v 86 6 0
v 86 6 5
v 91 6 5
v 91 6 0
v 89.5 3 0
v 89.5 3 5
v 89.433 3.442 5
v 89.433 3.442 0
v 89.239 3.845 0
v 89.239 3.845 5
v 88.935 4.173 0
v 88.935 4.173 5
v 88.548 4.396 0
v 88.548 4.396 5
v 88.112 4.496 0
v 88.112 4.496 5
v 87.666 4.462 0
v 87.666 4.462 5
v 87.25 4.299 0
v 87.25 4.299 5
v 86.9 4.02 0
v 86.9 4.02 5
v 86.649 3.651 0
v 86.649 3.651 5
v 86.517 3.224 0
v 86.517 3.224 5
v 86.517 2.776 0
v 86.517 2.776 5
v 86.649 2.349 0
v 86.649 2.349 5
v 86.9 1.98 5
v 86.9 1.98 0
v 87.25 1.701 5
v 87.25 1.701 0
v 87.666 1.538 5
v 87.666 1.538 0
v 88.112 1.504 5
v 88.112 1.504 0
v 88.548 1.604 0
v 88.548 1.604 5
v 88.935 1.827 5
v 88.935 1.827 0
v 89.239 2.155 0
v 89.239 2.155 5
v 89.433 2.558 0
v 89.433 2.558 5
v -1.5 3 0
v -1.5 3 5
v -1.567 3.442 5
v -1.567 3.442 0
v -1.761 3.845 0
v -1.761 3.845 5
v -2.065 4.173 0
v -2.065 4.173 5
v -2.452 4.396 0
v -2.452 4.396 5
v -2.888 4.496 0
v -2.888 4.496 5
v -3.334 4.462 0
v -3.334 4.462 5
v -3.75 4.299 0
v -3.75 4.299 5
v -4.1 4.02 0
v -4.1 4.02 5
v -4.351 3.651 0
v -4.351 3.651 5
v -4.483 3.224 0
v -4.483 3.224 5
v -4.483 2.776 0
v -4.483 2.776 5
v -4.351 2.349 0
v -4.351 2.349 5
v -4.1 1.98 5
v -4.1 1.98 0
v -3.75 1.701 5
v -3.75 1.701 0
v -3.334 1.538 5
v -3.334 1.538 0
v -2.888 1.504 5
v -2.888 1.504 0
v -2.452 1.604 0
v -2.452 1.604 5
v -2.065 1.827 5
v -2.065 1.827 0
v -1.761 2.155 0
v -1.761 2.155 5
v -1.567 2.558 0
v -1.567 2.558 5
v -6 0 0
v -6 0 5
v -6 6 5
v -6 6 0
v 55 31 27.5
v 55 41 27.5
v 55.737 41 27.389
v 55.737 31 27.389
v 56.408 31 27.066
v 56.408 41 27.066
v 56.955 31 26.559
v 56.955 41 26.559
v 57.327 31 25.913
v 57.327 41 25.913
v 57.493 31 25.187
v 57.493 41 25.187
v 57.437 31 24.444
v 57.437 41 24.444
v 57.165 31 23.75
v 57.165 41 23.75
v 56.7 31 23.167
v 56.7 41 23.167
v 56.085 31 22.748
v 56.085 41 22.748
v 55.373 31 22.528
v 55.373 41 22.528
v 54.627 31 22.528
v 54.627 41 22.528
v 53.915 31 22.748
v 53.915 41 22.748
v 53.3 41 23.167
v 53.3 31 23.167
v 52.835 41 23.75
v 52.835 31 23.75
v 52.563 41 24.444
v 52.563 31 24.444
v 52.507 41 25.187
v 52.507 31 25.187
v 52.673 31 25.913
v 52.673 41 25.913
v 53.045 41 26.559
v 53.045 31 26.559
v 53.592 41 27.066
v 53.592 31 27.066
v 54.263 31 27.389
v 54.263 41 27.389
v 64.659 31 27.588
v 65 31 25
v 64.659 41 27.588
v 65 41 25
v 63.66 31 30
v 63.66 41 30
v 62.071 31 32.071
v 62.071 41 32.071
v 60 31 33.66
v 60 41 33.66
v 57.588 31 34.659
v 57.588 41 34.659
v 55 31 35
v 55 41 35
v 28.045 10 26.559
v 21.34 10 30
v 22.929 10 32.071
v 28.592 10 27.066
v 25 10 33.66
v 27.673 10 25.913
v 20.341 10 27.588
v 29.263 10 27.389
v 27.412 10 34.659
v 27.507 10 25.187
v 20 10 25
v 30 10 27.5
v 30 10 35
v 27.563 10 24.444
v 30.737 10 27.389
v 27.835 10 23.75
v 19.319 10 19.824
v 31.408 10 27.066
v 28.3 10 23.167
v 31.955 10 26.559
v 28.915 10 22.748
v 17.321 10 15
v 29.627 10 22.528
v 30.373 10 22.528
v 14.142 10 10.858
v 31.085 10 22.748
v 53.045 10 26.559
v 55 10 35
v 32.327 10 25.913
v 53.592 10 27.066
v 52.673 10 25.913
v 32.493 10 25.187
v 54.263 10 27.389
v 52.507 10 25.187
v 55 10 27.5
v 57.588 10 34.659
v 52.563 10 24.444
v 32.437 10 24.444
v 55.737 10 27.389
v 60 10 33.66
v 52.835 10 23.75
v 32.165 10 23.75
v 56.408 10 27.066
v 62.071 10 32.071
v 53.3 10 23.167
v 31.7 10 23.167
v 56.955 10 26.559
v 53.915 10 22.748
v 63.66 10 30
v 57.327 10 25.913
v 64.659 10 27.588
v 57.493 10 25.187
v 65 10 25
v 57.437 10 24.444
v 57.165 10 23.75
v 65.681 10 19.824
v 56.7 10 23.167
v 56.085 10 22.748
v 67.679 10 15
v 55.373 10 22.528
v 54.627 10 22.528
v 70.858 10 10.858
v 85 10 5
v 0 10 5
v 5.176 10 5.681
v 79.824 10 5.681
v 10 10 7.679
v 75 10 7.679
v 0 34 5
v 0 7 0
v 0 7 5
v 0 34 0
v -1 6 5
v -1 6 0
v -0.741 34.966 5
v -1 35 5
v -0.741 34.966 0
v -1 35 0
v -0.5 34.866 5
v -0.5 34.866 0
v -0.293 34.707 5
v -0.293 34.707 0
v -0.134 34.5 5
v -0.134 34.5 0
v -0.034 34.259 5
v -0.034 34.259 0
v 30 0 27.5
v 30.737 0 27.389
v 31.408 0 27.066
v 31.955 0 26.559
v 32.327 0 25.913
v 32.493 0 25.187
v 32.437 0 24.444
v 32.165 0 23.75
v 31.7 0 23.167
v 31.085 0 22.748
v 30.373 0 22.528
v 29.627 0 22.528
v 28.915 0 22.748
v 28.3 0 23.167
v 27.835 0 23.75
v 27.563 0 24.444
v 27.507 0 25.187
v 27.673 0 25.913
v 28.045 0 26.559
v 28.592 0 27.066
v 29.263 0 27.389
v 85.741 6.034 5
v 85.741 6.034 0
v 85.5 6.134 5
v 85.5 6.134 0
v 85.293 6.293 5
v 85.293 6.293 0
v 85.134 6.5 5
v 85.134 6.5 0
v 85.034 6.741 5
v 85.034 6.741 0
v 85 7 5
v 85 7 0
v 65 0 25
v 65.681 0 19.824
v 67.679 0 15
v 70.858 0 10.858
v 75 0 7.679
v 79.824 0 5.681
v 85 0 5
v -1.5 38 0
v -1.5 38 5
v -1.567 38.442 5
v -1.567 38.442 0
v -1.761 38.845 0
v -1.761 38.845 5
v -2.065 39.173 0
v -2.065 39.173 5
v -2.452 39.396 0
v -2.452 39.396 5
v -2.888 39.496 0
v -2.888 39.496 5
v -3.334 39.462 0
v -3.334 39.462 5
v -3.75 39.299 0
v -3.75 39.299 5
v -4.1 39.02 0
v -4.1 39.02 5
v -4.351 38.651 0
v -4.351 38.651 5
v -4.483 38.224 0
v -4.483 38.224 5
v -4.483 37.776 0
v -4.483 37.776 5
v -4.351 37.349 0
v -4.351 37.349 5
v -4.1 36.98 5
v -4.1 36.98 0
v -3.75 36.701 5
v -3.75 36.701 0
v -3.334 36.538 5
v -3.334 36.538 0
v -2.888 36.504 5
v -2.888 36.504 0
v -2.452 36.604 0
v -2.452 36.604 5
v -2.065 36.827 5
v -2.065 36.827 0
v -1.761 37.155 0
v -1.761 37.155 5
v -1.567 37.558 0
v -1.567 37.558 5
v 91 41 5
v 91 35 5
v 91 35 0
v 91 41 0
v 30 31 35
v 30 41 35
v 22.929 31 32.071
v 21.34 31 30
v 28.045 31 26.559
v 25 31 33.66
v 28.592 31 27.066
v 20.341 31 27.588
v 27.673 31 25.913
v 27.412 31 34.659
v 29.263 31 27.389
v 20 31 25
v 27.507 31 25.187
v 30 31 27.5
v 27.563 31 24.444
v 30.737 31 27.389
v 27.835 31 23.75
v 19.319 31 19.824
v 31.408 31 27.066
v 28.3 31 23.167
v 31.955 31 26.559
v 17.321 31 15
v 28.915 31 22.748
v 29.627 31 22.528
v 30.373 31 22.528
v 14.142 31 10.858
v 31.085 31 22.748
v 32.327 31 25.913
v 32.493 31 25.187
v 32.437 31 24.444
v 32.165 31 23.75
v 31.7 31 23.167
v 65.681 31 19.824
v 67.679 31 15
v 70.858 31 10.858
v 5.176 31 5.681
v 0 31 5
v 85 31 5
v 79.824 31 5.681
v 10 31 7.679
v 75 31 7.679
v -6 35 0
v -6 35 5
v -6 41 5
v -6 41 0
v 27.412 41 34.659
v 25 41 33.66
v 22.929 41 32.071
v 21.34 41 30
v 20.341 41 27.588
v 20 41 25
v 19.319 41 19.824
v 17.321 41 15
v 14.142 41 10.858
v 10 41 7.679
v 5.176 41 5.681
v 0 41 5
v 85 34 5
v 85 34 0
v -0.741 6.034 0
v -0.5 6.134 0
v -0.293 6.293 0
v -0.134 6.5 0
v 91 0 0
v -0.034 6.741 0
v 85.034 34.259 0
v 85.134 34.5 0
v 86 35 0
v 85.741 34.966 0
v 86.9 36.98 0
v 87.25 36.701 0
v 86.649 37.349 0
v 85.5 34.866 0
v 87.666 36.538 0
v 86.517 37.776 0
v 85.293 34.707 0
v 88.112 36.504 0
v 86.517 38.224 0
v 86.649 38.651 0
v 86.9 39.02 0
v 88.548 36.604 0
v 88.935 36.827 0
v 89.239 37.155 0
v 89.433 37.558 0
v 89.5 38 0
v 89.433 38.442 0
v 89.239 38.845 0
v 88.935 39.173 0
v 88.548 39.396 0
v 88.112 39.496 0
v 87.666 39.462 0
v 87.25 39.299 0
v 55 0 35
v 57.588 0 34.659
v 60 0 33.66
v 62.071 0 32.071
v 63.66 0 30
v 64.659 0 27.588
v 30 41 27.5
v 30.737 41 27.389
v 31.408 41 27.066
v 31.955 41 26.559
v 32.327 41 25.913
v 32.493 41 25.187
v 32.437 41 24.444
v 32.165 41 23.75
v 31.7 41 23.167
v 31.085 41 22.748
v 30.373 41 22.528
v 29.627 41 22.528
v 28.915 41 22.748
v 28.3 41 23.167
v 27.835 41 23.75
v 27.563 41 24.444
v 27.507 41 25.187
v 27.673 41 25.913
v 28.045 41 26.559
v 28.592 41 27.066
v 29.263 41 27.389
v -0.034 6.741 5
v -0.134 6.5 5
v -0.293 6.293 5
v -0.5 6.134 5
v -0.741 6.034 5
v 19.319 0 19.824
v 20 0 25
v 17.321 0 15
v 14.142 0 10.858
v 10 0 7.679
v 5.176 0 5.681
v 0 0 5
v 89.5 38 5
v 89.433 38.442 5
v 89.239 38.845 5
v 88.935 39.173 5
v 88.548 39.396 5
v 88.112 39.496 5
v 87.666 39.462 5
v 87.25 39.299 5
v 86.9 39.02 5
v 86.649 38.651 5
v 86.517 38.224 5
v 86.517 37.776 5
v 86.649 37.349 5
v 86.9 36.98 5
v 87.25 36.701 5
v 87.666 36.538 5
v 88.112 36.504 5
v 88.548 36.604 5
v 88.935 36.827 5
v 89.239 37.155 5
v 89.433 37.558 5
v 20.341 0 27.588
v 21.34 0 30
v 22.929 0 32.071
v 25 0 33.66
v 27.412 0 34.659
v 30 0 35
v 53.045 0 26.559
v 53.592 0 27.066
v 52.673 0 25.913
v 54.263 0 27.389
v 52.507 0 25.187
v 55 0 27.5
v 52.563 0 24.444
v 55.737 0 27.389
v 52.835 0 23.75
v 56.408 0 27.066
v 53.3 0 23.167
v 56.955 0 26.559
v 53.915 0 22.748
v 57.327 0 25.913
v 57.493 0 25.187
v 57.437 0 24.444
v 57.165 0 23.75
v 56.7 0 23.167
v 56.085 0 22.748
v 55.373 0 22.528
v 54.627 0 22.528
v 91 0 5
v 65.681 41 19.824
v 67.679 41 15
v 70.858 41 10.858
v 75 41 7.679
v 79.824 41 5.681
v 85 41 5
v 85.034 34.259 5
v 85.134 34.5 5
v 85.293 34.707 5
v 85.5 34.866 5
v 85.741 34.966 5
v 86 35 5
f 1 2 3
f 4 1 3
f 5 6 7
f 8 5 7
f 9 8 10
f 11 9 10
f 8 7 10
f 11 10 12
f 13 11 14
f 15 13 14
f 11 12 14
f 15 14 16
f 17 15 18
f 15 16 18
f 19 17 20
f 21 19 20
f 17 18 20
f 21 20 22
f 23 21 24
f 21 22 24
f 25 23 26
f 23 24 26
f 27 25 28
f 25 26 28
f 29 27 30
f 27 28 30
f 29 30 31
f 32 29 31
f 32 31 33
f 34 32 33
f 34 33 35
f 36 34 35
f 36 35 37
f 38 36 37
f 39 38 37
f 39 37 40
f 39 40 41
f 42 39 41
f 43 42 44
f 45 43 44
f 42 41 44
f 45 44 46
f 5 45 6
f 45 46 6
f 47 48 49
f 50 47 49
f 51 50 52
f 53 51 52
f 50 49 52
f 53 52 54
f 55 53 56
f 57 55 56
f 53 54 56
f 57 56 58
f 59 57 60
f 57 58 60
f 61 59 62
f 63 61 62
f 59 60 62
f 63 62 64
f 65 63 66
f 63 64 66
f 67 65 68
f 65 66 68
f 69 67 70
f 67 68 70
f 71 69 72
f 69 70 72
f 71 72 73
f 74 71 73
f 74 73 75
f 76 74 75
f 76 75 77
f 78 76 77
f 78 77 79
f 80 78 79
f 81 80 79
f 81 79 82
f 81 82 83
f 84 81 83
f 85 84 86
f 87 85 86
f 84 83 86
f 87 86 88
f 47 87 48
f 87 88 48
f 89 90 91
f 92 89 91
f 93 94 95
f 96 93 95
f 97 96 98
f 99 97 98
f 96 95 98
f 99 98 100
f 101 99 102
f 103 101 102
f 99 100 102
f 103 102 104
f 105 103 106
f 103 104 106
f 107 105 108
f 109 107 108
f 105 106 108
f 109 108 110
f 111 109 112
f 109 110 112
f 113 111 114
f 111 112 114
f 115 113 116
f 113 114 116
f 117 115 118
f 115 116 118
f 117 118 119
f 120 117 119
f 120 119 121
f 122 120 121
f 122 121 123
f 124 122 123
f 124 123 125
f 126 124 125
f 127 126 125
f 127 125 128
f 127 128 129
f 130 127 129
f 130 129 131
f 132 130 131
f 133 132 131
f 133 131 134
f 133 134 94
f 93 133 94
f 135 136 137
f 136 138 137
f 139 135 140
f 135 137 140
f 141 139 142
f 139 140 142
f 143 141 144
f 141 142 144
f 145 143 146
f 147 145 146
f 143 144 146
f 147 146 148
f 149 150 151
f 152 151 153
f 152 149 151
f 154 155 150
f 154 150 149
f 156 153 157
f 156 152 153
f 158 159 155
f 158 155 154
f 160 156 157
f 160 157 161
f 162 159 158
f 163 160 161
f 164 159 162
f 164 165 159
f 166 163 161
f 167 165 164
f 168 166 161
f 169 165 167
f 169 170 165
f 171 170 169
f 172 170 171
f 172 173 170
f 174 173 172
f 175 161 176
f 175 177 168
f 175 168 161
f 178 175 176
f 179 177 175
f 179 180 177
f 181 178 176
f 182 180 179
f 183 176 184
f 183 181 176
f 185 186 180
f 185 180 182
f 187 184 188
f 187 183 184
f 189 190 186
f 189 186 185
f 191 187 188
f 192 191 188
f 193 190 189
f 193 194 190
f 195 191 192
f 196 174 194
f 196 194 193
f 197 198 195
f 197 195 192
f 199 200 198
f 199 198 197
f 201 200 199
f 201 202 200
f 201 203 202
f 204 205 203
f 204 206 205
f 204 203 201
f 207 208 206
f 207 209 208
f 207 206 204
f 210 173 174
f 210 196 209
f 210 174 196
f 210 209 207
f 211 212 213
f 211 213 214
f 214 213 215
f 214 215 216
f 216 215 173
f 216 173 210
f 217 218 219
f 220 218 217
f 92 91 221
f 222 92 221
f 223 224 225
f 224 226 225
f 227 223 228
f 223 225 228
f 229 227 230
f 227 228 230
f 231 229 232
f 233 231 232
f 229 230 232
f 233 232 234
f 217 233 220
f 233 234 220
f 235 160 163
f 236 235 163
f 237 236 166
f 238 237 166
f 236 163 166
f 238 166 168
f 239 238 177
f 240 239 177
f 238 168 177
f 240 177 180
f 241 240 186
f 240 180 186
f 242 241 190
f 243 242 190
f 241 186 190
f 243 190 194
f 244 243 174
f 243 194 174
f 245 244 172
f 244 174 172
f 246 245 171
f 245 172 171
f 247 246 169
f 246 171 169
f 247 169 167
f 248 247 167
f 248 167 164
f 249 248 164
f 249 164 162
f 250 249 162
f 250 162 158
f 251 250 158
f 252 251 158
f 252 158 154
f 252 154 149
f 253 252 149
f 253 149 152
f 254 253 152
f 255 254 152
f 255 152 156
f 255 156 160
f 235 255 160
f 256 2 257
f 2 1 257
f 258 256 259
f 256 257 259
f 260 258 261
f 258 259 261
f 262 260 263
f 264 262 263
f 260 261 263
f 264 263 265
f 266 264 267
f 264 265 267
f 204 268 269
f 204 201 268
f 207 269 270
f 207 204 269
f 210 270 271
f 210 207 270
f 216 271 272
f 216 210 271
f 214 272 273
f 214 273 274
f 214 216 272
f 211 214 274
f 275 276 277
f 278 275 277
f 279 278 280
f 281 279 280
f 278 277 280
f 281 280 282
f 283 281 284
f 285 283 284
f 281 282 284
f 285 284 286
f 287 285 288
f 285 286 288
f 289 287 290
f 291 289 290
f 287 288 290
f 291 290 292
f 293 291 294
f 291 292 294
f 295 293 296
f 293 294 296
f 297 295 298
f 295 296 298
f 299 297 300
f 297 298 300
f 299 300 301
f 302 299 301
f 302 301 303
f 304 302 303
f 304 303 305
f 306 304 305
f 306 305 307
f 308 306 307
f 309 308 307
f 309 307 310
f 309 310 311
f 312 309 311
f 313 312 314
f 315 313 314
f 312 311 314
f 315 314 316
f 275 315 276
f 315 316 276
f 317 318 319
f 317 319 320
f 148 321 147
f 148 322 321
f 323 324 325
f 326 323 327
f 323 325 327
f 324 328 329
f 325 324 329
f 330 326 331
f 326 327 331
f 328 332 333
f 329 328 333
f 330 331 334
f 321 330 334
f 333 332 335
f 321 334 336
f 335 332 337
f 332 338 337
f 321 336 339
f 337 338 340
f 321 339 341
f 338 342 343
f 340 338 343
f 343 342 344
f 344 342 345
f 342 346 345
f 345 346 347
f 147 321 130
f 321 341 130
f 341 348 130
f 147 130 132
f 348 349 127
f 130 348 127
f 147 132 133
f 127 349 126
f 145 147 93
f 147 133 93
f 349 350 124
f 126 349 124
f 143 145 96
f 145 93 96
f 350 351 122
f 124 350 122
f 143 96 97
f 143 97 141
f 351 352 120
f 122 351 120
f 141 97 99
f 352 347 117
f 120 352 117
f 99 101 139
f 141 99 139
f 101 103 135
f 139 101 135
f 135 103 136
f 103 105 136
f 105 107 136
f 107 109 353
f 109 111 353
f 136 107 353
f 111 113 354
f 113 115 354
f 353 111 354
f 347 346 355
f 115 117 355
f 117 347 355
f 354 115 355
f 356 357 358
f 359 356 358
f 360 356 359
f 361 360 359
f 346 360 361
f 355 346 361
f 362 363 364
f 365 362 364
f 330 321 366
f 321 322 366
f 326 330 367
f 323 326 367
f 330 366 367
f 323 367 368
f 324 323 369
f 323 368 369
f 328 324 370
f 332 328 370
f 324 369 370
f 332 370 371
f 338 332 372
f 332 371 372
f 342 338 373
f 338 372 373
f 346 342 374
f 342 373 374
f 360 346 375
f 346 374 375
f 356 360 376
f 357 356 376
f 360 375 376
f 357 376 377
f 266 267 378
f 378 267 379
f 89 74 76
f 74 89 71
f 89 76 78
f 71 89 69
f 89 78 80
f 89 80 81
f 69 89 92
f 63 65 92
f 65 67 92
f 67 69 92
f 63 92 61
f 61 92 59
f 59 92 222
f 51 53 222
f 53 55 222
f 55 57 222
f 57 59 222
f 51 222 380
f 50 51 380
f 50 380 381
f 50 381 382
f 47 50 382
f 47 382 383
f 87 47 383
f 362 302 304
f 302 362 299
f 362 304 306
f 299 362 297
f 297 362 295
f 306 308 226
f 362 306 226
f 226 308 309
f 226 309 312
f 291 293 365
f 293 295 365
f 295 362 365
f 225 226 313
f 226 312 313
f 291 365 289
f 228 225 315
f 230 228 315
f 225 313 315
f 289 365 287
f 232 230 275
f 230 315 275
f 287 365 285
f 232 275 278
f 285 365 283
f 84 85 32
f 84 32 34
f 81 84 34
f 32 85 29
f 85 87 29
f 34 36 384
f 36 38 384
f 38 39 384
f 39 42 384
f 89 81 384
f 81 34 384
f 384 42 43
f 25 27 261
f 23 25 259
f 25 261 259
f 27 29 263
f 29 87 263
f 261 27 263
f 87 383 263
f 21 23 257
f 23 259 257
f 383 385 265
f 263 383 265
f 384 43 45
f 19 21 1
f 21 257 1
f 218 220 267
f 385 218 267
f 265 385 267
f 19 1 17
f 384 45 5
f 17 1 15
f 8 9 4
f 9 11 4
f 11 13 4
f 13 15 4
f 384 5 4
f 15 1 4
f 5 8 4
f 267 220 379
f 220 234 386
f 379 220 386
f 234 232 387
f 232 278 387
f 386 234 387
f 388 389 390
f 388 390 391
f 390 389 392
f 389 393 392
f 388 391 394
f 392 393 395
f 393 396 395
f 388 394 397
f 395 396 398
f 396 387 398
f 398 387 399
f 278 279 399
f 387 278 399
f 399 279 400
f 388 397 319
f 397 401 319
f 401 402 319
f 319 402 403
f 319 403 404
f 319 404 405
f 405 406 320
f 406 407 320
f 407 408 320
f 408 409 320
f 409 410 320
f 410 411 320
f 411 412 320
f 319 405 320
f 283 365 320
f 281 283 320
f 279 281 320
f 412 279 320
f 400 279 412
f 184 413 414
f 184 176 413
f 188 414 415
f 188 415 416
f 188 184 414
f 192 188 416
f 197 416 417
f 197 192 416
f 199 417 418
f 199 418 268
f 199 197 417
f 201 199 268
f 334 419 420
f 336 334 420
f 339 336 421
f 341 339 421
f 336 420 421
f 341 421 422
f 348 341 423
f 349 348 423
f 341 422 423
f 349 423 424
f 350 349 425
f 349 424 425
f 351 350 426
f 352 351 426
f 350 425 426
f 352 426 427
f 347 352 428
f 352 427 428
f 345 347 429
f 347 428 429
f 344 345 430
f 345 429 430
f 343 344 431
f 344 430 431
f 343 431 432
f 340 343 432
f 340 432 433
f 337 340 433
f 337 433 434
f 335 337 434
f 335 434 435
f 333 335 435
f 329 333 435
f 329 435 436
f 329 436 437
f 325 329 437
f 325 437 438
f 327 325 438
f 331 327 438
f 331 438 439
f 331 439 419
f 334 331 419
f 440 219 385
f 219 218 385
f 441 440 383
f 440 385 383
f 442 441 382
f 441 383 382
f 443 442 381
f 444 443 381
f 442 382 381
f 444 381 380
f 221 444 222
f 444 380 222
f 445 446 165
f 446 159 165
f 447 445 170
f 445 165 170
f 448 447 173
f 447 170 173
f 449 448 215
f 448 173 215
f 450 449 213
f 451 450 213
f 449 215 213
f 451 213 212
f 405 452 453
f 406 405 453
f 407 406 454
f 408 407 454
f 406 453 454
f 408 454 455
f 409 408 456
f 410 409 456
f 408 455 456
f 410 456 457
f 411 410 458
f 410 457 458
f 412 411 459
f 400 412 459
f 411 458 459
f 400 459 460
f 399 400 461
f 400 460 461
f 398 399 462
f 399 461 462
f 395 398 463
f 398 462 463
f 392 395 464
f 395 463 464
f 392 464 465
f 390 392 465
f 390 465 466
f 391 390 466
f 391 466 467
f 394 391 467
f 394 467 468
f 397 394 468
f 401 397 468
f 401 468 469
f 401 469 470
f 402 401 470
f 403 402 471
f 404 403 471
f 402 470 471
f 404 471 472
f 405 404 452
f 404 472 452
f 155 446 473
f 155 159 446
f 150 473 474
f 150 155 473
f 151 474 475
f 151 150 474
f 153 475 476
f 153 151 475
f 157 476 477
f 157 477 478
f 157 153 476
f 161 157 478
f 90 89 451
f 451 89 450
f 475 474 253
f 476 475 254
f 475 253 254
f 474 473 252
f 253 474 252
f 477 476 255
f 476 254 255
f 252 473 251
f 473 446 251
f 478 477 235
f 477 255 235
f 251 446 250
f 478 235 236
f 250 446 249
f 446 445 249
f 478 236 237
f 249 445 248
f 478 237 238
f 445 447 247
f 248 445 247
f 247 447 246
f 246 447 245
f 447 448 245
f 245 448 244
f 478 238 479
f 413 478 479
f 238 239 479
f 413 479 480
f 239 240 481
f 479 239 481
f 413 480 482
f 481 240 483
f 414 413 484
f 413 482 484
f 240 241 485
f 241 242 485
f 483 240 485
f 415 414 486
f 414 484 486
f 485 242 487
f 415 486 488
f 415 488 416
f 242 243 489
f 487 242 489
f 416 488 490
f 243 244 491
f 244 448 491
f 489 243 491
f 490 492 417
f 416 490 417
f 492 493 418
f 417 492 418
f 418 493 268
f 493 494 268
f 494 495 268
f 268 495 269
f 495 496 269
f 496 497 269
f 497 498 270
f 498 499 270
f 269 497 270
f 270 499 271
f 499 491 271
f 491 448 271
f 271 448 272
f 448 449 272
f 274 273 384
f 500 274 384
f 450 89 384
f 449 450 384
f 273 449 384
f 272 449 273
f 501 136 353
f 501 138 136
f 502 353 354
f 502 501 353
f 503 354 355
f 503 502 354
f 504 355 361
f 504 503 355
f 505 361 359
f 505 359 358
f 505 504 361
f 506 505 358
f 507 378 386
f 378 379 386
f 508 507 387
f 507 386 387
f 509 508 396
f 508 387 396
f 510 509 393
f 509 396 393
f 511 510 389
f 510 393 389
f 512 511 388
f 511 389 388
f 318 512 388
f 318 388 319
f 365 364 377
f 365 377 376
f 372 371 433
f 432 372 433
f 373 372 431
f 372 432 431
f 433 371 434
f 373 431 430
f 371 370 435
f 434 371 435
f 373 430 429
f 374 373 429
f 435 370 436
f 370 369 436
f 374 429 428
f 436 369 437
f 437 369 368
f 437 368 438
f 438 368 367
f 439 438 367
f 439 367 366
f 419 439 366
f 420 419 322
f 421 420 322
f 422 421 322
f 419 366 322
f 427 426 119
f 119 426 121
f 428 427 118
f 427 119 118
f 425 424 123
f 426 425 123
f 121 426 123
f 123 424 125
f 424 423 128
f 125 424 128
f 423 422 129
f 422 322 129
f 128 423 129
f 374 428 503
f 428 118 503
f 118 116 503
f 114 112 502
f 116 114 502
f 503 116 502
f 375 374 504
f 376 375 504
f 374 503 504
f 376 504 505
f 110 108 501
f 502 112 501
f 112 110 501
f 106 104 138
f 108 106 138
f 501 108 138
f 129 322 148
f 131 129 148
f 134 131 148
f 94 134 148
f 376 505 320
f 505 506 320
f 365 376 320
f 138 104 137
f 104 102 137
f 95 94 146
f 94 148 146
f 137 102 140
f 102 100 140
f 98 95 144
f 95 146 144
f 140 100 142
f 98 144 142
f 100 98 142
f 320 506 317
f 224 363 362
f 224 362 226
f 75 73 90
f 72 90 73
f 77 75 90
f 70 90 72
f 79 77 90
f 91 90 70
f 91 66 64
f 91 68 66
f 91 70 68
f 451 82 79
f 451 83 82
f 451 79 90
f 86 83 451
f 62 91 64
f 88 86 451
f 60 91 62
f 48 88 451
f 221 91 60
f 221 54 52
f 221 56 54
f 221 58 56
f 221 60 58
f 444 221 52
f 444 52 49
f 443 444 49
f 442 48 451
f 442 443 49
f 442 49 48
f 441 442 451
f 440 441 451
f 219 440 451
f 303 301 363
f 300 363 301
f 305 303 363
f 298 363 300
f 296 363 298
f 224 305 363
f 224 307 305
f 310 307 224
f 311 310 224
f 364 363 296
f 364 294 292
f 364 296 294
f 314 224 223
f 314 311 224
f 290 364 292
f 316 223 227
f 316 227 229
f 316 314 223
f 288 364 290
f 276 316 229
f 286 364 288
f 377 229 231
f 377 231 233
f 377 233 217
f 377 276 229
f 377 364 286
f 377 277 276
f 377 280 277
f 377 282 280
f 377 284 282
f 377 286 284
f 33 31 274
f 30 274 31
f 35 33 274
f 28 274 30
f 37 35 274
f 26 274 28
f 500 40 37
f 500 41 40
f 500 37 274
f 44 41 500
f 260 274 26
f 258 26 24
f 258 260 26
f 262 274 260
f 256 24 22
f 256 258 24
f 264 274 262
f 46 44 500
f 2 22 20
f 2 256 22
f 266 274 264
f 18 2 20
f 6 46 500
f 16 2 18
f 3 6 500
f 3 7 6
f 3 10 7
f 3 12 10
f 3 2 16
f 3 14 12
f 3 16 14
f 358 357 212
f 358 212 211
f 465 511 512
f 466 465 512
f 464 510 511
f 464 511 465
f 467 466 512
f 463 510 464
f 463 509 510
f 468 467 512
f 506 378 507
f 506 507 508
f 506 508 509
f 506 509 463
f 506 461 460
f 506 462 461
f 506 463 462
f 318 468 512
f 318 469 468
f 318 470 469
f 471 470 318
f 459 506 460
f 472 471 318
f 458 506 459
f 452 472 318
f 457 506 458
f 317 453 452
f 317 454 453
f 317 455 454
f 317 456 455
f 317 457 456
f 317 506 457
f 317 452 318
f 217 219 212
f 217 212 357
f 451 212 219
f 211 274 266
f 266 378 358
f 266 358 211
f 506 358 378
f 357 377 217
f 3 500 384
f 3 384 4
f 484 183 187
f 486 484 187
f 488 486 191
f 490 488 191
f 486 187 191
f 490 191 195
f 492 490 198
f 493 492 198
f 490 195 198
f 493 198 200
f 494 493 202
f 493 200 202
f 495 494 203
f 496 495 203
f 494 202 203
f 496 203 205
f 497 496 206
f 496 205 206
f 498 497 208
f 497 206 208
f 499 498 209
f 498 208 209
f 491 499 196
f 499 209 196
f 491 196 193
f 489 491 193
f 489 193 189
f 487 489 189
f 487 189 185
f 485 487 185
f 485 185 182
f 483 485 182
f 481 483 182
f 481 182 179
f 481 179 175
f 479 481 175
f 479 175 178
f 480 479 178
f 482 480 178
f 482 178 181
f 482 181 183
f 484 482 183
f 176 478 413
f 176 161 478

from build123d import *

# Parameters (mm, degrees)
SKETCH1_W            = 85
SKETCH1_H            = 41
BOSS_EXTRUDE1_DEPTH  = 5
SKETCH3_W            = 45
SKETCH3_H            = 10
BOSS_EXTRUDE3_DEPTH  = 30
SKETCH4_W            = 6
SKETCH4_H            = 6
SKETCH4_R            = 1.5
BOSS_EXTRUDE4_DEPTH  = 5
LPATTERN1_COUNT      = 2
LPATTERN1_PITCH      = 35
LPATTERN1_COUNT_DIR2 = 2
LPATTERN1_PITCH_DIR2 = 91
FILLET1_R            = 20
SKETCH5_R            = 2.5
CUT_EXTRUDE1_DEPTH   = 41
FILLET2_R            = 1
FILLET3_R            = 10


with BuildPart() as part:
    # Sketch1 → Boss-Extrude1 (new body)
    with BuildSketch(Plane.XY):
        with Locations((42.5, 20.5)):
            Rectangle(SKETCH1_W, SKETCH1_H)
    extrude(amount=BOSS_EXTRUDE1_DEPTH)

    # Sketch3 → Boss-Extrude3 (add)
    with BuildSketch(Plane.XY.offset(5)):
        with Locations((42.5, 36)):
            Rectangle(SKETCH3_W, SKETCH3_H)
        with Locations((42.5, 5)):
            Rectangle(SKETCH3_W, SKETCH3_H)
    extrude(amount=BOSS_EXTRUDE3_DEPTH)

    # Sketch4 → Boss-Extrude4 (add)
    with BuildSketch(Plane.XY.offset(5)):
        with Locations((-3, 38)):
            Rectangle(SKETCH4_W, SKETCH4_H)
        with Locations((-3, 38)):
            Circle(SKETCH4_R, mode=Mode.SUBTRACT)
    boss_extrude4 = extrude(amount=-BOSS_EXTRUDE4_DEPTH)

    # LPattern1: Boss-Extrude4 2 × 2
    with Locations(*[(j * LPATTERN1_PITCH_DIR2, -i * LPATTERN1_PITCH, 0) for i in range(LPATTERN1_COUNT) for j in range(LPATTERN1_COUNT_DIR2) if (i, j) != (0, 0)]):
        add(boss_extrude4)

    # Fillet1
    fillet1_edges = [part.edges().sort_by_distance(p)[0] for p in [
        (20, 36, 5),
        (65, 36, 5),
        (20, 5, 5),
        (65, 5, 5),
    ]]
    fillet(fillet1_edges, radius=FILLET1_R - 0.0001)  # a hair under: the kernel refuses the full size

    # Sketch5 → Cut-Extrude1 (cut)
    with BuildSketch(Plane(origin=(0, 41, 0), x_dir=(1, 0, 0), z_dir=(0, 1, 0))):
        with Locations(Location((30, -25, 0), (0, 0, 270))):
            Circle(SKETCH5_R)
        with Locations(Location((55, -25, 0), (0, 0, 270))):
            Circle(SKETCH5_R)
    extrude(amount=-CUT_EXTRUDE1_DEPTH, mode=Mode.SUBTRACT)

    # Fillet2
    fillet2_edges = [part.edges().sort_by_distance(p)[0] for p in [
        (0, 35, 2.5),
        (85, 35, 2.5),
        (0, 6, 2.5),
        (85, 6, 2.5),
    ]]
    fillet(fillet2_edges, radius=FILLET2_R)

    # Fillet3
    fillet3_edges = [part.edges().sort_by_distance(p)[0] for p in [
        (65, 5, 35),
        (20, 5, 35),
        (65, 36, 35),
        (20, 36, 35),
    ]]
    fillet(fillet3_edges, radius=FILLET3_R)


solid = part.part
